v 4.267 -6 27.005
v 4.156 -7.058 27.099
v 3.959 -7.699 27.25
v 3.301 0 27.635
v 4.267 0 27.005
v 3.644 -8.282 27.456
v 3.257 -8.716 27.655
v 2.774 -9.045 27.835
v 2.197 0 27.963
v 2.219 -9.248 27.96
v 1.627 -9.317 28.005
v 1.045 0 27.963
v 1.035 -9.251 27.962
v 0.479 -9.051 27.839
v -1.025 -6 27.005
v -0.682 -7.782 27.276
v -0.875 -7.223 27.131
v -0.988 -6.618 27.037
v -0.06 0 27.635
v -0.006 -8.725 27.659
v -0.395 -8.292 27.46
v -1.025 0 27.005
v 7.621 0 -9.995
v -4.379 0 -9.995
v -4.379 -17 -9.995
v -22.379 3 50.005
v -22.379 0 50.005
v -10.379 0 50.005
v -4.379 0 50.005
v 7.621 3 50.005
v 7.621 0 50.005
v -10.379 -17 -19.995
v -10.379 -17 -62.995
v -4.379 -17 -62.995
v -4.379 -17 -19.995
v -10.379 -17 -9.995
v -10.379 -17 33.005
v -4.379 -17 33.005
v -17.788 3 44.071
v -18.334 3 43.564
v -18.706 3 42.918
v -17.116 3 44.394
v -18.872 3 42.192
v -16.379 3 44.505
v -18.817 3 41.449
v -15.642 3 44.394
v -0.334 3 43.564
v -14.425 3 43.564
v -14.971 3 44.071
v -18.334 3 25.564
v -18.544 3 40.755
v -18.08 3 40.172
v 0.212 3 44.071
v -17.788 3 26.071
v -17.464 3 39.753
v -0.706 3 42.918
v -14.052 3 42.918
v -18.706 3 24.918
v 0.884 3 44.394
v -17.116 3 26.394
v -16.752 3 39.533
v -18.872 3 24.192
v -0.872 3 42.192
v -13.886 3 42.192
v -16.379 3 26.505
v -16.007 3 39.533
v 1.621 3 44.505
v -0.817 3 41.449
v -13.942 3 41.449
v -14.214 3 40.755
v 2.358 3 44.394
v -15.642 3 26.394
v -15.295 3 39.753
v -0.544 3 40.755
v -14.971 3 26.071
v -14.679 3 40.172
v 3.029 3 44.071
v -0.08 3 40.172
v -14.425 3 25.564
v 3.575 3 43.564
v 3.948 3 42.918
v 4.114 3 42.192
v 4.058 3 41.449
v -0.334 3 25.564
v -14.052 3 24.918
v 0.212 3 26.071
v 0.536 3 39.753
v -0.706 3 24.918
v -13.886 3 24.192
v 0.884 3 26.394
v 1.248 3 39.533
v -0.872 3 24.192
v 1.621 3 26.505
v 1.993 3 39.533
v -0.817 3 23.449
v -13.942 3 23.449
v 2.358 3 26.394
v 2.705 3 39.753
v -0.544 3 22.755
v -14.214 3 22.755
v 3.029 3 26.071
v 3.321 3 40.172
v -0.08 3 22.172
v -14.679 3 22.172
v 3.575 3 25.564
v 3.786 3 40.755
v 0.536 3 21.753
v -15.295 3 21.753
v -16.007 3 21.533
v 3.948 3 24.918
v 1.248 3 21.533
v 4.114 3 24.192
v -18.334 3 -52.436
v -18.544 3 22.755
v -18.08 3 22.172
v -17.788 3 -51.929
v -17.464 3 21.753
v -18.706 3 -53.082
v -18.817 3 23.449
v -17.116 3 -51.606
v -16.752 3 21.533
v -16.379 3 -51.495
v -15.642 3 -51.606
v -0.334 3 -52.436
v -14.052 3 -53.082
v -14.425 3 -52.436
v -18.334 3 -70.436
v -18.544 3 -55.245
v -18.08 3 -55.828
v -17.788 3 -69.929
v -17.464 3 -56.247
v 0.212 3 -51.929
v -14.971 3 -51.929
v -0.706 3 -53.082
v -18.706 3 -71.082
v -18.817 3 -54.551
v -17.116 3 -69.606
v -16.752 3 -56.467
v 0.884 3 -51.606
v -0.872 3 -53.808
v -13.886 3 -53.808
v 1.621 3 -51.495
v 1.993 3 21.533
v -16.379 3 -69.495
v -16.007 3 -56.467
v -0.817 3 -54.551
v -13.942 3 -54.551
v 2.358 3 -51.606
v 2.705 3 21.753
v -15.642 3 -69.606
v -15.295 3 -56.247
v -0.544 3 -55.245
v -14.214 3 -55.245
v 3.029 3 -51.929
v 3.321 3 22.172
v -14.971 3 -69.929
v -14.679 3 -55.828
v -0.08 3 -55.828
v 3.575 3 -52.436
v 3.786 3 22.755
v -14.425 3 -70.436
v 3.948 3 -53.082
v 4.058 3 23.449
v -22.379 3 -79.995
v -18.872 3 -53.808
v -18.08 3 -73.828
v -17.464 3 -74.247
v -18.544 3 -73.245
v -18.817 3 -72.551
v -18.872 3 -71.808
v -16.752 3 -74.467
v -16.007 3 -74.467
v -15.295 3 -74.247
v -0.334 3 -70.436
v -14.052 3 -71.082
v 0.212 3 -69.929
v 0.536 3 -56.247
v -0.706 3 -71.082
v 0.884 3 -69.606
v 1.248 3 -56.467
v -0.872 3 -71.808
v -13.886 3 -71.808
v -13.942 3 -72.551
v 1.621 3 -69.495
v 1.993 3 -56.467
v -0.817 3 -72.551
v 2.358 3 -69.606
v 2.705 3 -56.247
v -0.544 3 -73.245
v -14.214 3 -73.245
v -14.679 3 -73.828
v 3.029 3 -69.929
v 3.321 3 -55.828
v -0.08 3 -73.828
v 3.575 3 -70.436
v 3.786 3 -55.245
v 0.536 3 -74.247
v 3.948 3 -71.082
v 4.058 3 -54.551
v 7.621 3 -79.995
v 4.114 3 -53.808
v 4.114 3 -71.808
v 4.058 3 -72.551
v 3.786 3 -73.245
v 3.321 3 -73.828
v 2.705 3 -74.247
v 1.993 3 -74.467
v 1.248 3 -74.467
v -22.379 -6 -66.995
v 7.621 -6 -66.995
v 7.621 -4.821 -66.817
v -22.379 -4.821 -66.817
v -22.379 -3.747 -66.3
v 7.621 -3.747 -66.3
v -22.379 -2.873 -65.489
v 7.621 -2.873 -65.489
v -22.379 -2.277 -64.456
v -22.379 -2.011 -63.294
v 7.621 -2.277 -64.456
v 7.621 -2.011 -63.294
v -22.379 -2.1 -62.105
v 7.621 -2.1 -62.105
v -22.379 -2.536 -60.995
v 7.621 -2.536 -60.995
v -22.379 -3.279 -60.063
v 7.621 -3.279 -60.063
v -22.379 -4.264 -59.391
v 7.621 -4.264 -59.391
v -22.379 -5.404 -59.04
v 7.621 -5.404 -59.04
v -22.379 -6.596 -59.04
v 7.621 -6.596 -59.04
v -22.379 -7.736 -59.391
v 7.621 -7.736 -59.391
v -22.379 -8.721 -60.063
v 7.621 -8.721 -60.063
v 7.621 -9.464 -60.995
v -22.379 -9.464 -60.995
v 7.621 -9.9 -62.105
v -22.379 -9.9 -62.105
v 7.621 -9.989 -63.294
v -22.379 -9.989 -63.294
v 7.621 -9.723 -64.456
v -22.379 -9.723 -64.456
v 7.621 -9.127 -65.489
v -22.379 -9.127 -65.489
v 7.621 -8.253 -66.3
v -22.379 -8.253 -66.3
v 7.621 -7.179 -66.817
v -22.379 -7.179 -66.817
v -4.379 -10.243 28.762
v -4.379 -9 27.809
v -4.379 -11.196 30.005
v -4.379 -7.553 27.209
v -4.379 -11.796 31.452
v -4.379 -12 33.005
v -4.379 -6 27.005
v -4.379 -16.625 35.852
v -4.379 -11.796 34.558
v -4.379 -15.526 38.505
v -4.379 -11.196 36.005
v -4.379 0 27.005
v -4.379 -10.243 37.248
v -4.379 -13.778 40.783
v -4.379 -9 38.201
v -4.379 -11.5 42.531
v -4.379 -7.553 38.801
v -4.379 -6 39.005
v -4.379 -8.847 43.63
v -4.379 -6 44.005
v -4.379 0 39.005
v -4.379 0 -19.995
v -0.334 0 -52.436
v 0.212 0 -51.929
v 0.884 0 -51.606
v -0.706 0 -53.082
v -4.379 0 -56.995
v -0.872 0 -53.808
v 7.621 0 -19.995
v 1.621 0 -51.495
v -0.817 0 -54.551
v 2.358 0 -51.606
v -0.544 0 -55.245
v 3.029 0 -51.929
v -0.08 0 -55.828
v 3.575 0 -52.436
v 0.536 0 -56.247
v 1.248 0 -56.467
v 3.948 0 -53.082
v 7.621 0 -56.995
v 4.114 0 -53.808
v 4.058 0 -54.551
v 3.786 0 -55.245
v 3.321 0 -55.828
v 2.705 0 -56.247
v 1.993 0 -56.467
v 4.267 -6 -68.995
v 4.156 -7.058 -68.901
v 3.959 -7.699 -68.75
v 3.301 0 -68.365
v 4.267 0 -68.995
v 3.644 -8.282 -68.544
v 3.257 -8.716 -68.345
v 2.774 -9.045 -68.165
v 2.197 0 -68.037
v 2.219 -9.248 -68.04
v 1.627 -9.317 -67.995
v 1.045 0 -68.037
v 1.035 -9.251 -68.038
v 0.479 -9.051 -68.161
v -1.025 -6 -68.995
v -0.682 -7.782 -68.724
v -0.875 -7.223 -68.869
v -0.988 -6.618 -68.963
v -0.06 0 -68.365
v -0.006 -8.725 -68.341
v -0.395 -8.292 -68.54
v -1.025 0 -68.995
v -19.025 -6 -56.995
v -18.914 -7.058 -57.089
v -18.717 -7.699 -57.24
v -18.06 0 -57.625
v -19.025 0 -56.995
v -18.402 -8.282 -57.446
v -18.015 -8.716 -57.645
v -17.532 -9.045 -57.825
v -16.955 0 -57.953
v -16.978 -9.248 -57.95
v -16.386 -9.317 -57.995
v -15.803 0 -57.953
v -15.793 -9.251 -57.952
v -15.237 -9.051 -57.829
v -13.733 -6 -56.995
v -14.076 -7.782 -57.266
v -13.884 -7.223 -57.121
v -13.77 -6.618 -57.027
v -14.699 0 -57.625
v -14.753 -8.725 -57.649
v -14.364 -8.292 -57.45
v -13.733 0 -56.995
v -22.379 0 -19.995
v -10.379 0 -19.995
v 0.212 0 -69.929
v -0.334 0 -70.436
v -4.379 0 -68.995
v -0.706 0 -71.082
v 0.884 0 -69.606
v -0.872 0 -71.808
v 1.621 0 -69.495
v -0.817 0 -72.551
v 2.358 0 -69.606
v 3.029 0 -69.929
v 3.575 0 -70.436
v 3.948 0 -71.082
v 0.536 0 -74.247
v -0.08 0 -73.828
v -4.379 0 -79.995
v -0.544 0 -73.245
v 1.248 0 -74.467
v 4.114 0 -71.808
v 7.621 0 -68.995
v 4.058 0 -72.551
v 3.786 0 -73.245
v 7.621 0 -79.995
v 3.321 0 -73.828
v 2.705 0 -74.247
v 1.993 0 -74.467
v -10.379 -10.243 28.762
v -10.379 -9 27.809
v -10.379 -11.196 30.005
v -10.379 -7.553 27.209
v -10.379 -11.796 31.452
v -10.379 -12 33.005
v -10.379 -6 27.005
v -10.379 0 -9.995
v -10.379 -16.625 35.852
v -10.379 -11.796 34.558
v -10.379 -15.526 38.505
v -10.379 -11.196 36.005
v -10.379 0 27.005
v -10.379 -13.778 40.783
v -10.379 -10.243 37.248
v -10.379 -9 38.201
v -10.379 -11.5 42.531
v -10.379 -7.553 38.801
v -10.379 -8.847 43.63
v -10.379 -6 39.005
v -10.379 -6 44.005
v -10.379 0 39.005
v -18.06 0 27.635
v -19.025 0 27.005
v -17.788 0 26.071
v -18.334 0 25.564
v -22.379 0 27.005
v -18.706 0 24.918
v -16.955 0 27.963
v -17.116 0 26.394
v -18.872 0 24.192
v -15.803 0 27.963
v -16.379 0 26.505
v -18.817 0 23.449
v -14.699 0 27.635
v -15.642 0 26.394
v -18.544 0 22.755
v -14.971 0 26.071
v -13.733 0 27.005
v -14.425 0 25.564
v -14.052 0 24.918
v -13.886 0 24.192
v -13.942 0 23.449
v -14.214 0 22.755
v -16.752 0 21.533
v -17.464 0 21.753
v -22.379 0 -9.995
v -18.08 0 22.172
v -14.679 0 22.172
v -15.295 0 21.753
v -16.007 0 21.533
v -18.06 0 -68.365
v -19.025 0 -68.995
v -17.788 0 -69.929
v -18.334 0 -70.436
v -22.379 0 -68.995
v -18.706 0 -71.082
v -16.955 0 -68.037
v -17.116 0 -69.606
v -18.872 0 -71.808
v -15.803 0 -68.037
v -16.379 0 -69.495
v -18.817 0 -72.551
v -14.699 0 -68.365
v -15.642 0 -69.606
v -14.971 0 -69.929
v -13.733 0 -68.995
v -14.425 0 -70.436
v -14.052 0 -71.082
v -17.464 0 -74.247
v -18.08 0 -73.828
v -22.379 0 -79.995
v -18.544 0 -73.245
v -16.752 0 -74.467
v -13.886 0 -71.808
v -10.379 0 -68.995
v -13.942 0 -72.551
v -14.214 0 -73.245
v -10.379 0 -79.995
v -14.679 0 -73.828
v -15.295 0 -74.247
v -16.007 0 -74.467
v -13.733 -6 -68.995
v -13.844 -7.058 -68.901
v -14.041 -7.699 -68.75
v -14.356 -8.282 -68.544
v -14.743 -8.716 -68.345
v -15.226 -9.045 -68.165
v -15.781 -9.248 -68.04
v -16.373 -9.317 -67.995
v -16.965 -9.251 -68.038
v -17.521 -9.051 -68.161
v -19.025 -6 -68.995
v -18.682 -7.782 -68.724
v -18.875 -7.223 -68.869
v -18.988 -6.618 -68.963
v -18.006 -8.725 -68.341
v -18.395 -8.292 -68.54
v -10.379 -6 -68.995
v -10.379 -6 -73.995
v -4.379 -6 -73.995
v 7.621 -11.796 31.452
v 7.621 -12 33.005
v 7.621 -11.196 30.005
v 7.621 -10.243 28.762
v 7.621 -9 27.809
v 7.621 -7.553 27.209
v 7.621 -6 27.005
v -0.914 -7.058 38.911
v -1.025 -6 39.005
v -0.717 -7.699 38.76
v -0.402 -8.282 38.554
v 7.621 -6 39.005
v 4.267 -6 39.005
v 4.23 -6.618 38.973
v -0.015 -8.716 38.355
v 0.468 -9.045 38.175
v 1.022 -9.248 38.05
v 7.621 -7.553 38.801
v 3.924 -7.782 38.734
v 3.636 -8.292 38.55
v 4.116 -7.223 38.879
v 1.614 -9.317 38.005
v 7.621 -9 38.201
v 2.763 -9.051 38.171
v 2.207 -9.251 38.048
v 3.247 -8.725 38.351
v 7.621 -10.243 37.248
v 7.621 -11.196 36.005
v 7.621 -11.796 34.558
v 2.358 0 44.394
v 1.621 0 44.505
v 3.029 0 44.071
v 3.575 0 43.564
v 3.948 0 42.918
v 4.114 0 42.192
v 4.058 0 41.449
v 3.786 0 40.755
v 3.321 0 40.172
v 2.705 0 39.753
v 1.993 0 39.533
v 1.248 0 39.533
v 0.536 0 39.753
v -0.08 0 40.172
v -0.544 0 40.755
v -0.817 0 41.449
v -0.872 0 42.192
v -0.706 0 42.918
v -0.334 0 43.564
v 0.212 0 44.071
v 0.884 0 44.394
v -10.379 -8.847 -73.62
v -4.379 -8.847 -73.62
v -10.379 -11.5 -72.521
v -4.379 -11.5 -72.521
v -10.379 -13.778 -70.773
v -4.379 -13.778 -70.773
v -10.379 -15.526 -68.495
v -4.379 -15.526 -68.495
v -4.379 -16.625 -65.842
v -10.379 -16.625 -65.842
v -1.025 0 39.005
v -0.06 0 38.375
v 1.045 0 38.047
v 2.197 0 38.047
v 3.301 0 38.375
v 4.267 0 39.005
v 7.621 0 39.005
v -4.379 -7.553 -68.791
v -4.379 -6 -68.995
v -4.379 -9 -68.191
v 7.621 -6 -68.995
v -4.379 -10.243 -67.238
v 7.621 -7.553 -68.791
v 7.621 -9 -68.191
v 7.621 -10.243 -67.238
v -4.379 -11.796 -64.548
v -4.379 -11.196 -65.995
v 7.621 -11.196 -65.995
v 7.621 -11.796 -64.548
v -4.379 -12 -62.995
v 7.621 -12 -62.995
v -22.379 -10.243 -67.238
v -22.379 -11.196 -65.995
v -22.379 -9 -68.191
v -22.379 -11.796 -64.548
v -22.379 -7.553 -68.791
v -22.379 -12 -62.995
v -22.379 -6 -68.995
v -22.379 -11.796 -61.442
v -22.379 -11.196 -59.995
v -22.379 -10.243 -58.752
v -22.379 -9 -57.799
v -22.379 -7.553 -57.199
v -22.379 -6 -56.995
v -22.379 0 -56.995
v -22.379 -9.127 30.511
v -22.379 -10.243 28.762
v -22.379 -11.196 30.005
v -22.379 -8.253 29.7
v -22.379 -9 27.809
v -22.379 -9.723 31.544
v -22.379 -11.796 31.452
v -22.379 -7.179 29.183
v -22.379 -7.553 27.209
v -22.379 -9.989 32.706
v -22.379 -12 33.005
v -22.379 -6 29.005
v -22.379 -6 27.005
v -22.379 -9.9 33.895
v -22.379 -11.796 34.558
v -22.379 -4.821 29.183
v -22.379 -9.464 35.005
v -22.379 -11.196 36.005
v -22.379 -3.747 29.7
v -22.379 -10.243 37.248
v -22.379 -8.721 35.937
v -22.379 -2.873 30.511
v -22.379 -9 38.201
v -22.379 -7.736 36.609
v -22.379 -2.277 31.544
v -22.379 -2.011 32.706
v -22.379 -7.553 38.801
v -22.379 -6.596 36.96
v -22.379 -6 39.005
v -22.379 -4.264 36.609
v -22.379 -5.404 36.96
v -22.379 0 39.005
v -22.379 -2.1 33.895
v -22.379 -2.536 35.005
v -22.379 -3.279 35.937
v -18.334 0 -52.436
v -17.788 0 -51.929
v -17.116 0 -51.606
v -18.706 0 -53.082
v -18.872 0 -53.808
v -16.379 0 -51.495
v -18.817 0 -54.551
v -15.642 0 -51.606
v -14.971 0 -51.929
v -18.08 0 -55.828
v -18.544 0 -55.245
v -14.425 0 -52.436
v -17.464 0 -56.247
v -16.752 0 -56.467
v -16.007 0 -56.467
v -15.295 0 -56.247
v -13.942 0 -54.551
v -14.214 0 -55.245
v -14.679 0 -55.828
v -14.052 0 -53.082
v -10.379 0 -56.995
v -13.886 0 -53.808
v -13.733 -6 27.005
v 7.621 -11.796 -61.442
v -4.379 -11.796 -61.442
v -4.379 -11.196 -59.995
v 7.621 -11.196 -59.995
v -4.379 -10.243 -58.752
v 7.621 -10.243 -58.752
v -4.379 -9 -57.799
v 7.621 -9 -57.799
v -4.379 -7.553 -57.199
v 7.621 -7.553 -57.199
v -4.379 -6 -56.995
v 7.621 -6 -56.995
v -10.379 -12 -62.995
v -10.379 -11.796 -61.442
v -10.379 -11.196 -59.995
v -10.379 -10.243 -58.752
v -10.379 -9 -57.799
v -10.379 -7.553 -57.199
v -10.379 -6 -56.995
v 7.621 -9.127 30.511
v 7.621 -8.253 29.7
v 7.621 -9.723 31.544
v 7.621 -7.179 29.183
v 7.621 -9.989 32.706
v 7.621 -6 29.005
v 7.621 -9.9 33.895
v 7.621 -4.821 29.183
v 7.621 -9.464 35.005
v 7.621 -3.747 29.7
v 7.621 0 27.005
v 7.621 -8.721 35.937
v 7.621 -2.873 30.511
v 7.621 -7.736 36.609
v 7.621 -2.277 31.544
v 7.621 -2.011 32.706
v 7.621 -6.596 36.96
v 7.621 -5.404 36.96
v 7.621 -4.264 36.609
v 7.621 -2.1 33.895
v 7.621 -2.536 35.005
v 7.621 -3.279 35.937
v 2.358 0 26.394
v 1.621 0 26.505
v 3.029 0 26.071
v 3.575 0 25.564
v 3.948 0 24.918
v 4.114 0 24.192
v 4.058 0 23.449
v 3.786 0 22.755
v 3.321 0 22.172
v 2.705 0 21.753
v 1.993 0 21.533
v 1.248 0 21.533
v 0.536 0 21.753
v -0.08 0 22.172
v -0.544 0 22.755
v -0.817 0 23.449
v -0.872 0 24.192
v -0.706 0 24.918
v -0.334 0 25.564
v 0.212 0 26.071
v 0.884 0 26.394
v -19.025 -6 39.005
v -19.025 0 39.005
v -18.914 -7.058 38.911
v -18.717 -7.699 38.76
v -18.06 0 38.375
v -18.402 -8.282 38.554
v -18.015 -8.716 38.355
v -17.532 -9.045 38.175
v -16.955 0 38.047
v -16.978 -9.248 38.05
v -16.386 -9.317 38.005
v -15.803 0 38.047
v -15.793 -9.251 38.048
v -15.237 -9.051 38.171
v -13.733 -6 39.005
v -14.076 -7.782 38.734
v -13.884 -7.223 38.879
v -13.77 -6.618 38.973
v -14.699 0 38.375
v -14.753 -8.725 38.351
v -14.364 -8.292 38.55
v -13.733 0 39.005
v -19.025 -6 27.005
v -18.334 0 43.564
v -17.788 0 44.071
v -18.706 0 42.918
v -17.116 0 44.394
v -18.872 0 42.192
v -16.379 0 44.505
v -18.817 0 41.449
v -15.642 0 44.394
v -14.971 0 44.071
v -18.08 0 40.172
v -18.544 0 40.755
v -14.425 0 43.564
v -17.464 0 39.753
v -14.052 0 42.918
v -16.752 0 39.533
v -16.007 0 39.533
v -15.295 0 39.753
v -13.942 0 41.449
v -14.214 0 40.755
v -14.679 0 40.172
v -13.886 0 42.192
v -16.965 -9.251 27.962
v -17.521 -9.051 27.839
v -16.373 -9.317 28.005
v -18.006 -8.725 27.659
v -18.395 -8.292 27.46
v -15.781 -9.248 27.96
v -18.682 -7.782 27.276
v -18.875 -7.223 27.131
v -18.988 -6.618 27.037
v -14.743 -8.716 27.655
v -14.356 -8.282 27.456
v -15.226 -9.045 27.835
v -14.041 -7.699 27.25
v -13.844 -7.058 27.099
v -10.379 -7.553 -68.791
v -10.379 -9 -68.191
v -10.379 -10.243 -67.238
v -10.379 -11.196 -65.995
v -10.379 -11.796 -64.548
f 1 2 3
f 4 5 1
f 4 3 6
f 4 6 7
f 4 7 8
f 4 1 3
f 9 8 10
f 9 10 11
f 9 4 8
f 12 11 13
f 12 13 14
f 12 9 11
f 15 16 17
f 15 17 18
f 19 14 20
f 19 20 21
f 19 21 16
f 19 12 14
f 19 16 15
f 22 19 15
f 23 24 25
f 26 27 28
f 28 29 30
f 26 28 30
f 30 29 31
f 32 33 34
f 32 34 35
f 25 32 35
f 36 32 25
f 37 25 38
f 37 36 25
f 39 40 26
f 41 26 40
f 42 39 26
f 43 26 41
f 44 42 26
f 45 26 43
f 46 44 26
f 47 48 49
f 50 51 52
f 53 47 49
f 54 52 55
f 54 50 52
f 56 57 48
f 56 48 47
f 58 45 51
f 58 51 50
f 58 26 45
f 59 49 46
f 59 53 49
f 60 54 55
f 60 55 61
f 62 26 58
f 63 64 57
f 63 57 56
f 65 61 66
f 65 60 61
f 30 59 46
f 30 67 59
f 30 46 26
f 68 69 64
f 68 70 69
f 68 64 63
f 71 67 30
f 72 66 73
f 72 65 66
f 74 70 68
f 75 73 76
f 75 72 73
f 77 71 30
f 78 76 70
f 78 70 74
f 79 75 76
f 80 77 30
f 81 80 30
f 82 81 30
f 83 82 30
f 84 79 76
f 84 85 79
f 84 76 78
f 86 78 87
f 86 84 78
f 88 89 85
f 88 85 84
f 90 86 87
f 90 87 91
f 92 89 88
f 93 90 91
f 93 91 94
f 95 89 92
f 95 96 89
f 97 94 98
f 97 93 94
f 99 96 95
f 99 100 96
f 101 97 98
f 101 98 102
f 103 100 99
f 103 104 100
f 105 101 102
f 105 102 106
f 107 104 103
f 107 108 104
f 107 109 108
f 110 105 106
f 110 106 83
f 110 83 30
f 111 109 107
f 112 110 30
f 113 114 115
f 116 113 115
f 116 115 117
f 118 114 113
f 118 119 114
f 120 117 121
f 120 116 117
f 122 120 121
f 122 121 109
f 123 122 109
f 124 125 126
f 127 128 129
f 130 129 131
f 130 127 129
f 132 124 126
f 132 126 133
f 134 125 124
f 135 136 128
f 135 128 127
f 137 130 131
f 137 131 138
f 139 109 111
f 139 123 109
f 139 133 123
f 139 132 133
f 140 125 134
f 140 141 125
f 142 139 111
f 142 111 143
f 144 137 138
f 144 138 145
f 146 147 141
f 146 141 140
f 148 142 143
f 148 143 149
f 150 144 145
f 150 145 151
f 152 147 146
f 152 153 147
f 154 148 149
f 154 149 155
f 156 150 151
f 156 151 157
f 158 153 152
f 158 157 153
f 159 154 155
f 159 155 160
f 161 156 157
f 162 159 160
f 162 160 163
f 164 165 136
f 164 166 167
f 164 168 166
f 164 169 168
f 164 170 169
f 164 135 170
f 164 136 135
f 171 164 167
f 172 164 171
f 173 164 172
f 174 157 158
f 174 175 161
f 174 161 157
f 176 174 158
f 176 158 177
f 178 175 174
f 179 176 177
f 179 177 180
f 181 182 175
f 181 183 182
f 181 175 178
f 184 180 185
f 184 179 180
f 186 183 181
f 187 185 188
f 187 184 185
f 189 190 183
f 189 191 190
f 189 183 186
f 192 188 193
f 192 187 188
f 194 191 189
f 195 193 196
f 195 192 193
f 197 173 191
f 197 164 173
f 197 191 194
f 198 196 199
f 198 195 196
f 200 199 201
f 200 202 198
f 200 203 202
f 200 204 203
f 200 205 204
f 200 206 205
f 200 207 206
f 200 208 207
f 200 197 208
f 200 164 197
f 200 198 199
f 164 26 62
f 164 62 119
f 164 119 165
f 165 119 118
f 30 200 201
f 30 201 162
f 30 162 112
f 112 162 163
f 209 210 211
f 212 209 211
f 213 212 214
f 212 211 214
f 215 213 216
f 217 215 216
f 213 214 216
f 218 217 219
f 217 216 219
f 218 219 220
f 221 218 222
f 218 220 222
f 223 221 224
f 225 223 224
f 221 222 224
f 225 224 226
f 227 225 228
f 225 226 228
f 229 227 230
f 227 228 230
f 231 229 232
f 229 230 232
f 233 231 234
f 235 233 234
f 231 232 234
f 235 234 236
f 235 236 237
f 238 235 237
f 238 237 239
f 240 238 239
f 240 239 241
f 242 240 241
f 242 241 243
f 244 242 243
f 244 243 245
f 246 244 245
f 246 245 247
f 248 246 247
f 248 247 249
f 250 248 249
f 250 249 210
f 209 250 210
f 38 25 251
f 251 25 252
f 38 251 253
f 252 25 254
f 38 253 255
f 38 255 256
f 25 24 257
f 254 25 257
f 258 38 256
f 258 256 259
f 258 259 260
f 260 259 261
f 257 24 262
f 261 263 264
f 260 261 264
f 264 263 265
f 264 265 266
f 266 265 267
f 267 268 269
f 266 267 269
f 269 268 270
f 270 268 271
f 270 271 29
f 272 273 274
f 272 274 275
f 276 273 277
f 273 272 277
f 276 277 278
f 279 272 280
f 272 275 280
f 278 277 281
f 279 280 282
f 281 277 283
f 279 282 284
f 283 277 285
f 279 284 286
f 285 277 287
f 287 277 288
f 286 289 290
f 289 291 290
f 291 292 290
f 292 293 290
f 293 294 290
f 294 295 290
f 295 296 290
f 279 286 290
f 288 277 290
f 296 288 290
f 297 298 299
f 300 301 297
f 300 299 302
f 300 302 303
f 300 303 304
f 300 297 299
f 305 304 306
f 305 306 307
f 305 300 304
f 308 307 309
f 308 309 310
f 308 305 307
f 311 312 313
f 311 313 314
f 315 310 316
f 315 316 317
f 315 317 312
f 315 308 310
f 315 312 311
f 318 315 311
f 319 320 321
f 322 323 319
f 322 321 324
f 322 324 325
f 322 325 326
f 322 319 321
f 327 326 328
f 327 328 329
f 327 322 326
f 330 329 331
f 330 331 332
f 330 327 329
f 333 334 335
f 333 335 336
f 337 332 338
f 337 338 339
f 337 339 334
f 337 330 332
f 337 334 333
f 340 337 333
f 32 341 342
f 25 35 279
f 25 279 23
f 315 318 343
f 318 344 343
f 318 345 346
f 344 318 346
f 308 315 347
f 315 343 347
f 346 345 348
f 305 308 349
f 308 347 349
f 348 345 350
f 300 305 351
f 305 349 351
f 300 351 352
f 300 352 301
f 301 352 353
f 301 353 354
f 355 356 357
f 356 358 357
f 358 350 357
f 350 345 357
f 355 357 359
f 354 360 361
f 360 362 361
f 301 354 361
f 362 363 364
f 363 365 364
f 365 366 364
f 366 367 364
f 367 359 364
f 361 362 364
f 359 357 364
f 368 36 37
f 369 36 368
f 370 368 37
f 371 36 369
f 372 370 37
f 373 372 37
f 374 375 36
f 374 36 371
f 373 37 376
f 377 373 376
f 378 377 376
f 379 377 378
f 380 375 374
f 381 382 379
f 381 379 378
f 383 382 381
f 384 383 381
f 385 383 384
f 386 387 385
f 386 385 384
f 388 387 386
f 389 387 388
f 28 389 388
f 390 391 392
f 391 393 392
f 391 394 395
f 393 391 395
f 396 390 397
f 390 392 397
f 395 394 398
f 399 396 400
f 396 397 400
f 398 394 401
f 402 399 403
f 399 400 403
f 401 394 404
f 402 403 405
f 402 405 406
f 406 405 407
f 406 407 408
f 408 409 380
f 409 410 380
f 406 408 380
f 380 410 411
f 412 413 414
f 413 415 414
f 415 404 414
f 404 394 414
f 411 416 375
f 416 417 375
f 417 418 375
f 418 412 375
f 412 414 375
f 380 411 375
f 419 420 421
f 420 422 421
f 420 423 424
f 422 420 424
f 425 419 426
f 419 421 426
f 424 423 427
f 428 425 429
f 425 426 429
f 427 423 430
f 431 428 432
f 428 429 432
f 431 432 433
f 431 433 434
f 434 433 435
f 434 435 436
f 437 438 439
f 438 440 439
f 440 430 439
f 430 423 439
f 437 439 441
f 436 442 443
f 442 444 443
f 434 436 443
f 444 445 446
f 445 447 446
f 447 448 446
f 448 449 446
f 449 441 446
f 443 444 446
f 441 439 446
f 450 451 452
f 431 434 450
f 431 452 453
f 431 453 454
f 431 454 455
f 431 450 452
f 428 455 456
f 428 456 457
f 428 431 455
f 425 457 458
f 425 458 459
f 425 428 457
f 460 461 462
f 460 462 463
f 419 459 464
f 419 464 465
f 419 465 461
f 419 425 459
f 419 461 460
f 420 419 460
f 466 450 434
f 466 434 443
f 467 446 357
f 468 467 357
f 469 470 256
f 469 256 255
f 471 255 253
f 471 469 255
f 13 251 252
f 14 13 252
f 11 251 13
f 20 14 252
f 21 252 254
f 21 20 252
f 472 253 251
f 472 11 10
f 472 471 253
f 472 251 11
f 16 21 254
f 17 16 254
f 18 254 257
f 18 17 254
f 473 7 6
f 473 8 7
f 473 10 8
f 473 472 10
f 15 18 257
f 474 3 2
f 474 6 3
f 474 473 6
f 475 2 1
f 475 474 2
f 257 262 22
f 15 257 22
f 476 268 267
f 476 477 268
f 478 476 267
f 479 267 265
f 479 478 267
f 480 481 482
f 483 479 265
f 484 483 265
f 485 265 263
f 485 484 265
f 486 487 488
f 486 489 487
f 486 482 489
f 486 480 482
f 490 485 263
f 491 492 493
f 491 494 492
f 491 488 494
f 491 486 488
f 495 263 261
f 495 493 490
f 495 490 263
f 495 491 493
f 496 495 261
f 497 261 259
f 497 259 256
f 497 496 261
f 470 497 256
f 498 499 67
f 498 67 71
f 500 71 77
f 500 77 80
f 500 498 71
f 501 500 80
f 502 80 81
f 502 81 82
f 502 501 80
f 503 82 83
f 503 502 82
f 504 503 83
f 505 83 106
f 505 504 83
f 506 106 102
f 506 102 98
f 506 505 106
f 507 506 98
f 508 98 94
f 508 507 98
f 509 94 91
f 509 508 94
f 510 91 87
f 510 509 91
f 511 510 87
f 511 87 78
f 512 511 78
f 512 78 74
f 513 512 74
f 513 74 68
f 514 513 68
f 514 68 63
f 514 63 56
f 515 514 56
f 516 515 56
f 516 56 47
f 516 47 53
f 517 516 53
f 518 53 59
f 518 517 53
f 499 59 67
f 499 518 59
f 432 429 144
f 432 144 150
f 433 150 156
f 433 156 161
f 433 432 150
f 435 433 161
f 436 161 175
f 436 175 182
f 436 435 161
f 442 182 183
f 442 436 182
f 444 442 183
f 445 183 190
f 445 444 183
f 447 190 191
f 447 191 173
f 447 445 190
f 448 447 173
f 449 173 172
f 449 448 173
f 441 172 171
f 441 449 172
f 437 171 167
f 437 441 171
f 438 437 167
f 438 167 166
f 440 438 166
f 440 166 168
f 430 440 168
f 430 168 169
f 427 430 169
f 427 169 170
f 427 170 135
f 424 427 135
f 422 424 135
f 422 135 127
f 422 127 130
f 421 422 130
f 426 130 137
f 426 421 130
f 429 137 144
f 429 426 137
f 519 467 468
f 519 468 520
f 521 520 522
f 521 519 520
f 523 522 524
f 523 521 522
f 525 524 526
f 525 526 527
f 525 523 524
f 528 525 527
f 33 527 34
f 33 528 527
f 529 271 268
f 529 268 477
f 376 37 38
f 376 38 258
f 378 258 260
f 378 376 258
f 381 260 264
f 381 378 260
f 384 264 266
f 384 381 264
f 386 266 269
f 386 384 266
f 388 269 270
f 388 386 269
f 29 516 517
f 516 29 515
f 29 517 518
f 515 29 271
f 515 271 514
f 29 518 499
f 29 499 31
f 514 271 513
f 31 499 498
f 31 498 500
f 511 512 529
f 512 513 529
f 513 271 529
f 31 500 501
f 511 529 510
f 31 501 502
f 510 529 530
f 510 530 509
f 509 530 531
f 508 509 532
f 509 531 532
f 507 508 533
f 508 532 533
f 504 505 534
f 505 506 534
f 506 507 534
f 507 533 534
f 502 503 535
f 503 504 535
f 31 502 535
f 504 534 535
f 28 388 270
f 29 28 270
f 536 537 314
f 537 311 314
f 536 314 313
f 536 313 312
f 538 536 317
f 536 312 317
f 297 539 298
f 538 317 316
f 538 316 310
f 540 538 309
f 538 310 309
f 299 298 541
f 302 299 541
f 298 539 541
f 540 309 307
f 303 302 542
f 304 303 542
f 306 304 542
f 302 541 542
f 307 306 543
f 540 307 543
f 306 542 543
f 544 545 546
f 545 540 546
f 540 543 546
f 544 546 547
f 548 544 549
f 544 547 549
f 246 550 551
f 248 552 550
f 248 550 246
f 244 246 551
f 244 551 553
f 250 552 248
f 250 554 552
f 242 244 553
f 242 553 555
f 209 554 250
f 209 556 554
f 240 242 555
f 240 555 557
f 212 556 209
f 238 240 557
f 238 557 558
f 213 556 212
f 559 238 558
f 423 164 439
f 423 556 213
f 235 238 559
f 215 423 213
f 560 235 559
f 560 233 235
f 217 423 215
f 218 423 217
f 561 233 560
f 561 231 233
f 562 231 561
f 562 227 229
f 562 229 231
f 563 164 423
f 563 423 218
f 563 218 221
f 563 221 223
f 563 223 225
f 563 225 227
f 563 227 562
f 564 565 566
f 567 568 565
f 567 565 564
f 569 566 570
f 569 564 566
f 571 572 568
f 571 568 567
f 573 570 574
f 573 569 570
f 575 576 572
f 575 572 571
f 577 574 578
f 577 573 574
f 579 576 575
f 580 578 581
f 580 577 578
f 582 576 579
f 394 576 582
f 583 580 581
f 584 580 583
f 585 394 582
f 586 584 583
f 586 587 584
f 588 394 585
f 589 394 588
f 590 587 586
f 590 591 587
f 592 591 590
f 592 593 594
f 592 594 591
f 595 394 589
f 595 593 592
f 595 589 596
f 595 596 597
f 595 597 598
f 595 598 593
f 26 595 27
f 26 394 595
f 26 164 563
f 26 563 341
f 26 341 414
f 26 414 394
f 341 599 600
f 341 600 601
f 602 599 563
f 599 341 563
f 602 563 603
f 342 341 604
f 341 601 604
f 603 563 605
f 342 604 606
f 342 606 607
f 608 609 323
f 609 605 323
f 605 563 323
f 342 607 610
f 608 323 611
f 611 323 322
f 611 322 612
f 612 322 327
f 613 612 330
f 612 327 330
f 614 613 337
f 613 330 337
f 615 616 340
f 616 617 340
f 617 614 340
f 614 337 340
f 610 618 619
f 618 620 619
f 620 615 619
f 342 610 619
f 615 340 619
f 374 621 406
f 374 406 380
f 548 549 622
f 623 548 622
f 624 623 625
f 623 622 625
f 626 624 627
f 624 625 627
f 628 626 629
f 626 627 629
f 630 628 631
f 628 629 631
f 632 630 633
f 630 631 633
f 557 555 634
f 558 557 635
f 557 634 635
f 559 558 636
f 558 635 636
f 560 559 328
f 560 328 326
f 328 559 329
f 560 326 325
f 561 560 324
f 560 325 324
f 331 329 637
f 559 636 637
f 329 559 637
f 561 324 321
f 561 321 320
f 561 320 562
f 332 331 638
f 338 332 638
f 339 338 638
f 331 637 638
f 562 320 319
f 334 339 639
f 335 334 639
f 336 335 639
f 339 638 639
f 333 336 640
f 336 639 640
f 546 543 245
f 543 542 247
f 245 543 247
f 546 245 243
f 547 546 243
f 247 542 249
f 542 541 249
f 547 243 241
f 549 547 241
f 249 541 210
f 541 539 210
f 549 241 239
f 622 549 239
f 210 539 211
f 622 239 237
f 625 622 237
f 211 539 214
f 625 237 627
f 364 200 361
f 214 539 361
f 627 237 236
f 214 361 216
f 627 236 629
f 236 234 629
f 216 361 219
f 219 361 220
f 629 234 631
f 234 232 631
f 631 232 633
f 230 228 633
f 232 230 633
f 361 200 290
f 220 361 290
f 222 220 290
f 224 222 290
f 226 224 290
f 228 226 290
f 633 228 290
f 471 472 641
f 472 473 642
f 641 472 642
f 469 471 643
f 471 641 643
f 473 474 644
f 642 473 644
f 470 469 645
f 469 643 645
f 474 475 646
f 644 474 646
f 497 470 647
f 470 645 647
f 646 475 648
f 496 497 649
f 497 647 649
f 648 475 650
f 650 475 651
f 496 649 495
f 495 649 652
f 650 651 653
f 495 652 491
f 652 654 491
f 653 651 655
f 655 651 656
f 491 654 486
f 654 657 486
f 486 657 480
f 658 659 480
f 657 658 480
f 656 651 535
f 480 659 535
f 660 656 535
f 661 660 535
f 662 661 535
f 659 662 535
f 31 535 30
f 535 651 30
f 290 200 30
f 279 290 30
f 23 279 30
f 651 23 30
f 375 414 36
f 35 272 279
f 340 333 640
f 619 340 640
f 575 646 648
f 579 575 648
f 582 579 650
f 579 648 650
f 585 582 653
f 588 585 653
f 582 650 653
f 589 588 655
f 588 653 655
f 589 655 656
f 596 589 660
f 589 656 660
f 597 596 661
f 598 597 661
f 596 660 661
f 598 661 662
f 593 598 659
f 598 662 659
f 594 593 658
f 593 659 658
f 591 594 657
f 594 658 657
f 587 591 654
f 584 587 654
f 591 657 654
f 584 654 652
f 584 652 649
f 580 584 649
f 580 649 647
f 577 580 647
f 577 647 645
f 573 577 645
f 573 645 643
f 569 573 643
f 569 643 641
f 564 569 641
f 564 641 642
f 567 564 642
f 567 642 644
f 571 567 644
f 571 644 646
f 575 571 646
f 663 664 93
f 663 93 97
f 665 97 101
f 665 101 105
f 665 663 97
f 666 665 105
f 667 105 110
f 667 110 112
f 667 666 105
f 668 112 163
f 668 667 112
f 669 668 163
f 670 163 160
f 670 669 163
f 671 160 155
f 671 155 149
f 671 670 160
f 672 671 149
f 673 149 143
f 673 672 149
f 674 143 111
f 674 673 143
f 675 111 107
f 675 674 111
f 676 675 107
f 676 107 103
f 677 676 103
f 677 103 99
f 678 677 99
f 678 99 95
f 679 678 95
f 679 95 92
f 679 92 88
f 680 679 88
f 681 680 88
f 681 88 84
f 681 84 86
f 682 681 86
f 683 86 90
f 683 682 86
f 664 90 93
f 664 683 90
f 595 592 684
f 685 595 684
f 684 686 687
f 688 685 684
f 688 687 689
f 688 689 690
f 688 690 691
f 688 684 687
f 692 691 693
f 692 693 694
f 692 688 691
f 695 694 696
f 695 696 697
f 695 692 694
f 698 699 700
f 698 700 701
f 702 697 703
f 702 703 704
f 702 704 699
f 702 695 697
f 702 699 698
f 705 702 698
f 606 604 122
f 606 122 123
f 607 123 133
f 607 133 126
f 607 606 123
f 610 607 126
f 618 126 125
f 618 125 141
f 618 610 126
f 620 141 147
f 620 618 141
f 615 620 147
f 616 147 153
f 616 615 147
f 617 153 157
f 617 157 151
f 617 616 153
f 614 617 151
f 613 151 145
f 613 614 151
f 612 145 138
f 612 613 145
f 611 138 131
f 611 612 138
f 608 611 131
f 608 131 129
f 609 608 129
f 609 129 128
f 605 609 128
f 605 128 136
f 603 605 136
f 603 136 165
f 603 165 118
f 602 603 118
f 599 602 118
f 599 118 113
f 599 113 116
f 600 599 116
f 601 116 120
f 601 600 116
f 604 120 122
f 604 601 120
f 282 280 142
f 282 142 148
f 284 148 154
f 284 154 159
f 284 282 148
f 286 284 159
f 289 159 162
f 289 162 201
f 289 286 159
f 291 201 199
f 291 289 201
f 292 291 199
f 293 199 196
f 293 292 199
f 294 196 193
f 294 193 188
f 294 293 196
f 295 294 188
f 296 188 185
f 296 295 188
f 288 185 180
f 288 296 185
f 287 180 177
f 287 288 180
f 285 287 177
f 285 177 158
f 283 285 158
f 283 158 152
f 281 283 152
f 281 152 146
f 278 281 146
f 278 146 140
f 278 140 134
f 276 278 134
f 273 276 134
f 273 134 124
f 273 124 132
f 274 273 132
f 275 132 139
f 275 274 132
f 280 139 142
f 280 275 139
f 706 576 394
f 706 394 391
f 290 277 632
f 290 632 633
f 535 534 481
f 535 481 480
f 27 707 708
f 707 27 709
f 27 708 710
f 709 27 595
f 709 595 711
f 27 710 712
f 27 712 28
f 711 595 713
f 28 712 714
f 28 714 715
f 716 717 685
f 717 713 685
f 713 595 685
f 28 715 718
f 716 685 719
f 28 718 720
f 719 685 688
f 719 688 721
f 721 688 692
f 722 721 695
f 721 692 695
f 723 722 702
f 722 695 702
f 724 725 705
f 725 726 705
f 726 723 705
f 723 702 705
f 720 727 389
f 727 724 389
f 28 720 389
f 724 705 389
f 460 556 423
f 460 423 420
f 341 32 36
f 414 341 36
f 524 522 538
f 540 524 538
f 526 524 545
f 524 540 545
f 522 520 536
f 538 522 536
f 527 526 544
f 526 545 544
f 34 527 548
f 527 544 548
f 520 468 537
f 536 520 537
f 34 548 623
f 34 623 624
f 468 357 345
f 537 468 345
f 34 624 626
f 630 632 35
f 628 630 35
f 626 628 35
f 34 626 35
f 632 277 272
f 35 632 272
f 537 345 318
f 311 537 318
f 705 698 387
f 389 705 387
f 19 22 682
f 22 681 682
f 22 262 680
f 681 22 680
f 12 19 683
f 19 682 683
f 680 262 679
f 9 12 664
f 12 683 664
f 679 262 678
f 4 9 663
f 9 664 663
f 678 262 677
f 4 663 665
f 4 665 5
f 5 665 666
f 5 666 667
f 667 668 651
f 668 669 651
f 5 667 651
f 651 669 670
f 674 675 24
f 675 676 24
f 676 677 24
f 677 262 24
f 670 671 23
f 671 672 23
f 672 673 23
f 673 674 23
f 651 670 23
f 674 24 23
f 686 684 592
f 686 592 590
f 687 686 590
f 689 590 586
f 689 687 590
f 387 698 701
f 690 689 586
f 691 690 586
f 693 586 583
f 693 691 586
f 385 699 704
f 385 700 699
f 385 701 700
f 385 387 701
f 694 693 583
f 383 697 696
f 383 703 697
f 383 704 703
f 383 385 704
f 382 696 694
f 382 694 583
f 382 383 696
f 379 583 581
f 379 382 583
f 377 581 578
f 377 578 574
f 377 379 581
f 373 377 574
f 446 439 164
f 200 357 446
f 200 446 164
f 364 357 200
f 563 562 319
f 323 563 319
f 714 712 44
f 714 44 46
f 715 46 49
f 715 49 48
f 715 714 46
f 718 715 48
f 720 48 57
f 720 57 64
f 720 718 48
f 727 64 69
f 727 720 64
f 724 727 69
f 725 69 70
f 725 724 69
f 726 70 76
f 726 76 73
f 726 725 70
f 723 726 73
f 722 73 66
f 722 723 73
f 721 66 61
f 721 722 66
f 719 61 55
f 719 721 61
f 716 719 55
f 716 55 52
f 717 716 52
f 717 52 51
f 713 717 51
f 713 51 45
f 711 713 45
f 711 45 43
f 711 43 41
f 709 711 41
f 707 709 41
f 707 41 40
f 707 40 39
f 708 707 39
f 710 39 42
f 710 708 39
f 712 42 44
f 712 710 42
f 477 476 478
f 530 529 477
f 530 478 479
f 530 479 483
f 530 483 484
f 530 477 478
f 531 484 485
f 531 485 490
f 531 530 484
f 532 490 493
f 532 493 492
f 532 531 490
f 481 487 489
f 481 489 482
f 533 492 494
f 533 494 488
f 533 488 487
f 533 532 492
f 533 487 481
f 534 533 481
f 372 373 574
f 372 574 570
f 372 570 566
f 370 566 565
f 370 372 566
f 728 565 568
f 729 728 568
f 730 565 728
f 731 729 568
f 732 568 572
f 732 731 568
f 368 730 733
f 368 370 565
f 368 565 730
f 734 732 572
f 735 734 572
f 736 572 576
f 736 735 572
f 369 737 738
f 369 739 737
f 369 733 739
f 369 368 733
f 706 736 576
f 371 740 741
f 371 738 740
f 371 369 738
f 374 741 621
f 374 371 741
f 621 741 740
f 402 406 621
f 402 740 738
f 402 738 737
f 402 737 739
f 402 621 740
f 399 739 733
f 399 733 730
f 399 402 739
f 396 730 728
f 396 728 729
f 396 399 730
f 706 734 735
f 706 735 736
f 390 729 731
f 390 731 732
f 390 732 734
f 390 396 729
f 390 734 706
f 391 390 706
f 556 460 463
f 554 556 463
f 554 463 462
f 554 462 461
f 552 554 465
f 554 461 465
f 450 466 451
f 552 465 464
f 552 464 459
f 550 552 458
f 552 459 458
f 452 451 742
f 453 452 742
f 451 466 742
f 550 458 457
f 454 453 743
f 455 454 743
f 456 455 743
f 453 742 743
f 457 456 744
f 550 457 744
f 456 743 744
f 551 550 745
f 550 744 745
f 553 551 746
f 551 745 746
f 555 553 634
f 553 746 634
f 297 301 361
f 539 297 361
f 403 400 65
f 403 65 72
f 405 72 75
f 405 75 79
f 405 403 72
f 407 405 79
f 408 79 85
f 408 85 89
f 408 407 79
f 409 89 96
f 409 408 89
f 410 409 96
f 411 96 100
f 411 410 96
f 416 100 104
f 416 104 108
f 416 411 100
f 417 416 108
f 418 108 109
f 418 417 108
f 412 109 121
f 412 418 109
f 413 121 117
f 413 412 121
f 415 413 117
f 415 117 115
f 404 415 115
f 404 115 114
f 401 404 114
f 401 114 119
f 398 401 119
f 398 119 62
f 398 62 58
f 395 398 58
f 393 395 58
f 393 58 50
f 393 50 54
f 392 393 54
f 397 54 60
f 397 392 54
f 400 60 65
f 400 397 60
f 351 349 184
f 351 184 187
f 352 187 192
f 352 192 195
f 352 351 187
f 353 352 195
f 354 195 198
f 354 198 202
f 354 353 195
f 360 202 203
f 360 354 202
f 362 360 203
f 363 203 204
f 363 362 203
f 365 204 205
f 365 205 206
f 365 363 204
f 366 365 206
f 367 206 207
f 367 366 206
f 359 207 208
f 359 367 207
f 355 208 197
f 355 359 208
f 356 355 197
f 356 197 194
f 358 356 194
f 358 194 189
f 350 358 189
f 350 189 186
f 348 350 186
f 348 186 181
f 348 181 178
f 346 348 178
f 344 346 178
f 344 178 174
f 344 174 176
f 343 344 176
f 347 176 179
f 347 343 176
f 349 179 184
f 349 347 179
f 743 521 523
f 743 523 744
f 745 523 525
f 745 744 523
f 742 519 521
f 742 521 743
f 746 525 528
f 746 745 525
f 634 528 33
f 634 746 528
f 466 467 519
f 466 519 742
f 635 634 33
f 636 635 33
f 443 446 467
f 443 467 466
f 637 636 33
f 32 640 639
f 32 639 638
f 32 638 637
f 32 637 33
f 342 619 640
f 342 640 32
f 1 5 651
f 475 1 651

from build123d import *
from OCP.BRepFilletAPI import BRepFilletAPI_MakeChamfer

# Parameters (mm, degrees)
SKETCH1_W           = 30
SKETCH1_H           = 130
SKETCH1_R           = 2.5
BOSS_EXTRUDE1_DEPTH = 3
SKETCH2_W           = 30
SKETCH2_H           = 12
BOSS_EXTRUDE2_DEPTH = 12
CUT_EXTRUDE1_REACH  = 88.274
SKETCH3_R           = 4
FILLET1_R           = 6
SKETCH4_R           = 4
CUT_EXTRUDE2_DEPTH  = 19
SKETCH5_W           = 6
SKETCH5_H           = 84
SKETCH5_H_2         = 11
BOSS_EXTRUDE3_DEPTH = 6
CHAMFER1_SIZE       = 6
BOSS_EXTRUDE4_DEPTH = 6
SKETCH7_W           = 12
SKETCH7_H           = 10
BOSS_EXTRUDE5_DEPTH = 17
CHAMFER2_SIZE       = 17
CHAMFER2_SIZE2      = 12


with BuildPart() as part:
    # Sketch1 → Boss-Extrude1 (new body)
    with BuildSketch(Plane(origin=(0, 0, 0), x_dir=(1, 0, 0), z_dir=(0, 1, 0))):
        with Locations((-7.37923135, 14.994995261)):
            Rectangle(SKETCH1_W, SKETCH1_H)
        with Locations(Location((-16.37923135, -24.005004739, 0), (0, 0, 270))):
            Circle(SKETCH1_R, mode=Mode.SUBTRACT)
        with Locations(Location((1.62076865, -24.005004739, 0), (0, 0, 270))):
            Circle(SKETCH1_R, mode=Mode.SUBTRACT)
        with Locations(Location((1.62076865, -42.005004739, 0), (0, 0, 270))):
            Circle(SKETCH1_R, mode=Mode.SUBTRACT)
        with Locations(Location((-16.37923135, -42.005004739, 0), (0, 0, 270))):
            Circle(SKETCH1_R, mode=Mode.SUBTRACT)
        with Locations(Location((-16.37923135, 71.994995261, 0), (0, 0, 270))):
            Circle(SKETCH1_R, mode=Mode.SUBTRACT)
        with Locations(Location((-16.37923135, 53.994995261, 0), (0, 0, 270))):
            Circle(SKETCH1_R, mode=Mode.SUBTRACT)
        with Locations(Location((1.62076865, 71.994995261, 0), (0, 0, 270))):
            Circle(SKETCH1_R, mode=Mode.SUBTRACT)
        with Locations(Location((1.62076865, 53.994995261, 0), (0, 0, 270))):
            Circle(SKETCH1_R, mode=Mode.SUBTRACT)
    extrude(amount=BOSS_EXTRUDE1_DEPTH)

    # Sketch2 → Boss-Extrude2 (add)
    with BuildSketch(Plane.XZ):
        with Locations((-7.37923135, -62.994995261)):
            Rectangle(SKETCH2_W, SKETCH2_H)
        with Locations((-7.37923135, 33.005004739)):
            Rectangle(SKETCH2_W, SKETCH2_H)
    extrude(amount=BOSS_EXTRUDE2_DEPTH)

    # Sketch3 → Cut-Extrude1 (cut, up to next)
    with BuildSketch(Plane(origin=(7.62076865, 0, 0), x_dir=(0, 0, -1), z_dir=(1, 0, 0)), mode=Mode.PRIVATE) as cut_extrude1_sk1:
        with Locations((-33.005004739, -6)):
            Circle(SKETCH3_R)
    cut_extrude1_tool1 = extrude(cut_extrude1_sk1.sketch, amount=-CUT_EXTRUDE1_REACH, mode=Mode.PRIVATE) & part.part
    # Sketch3 → Cut-Extrude1 (cut, up to next)
    with BuildSketch(Plane(origin=(7.62076865, 0, 0), x_dir=(0, 0, -1), z_dir=(1, 0, 0)), mode=Mode.PRIVATE) as cut_extrude1_sk2:
        with Locations((62.994995261, -6)):
            Circle(SKETCH3_R)
    cut_extrude1_tool2 = extrude(cut_extrude1_sk2.sketch, amount=-CUT_EXTRUDE1_REACH, mode=Mode.PRIVATE) & part.part
    add(cut_extrude1_tool1.solids().sort_by_distance((7.620769, -6, 33.005005))[0], mode=Mode.SUBTRACT)
    add(cut_extrude1_tool2.solids().sort_by_distance((7.620769, -6, -62.994995))[0], mode=Mode.SUBTRACT)

    # Fillet1
    fillet1_edges = [part.edges().sort_by_distance(p)[0] for p in [
        (-7.37923135, -12, -68.994995261),
        (-7.37923135, -12, -56.994995261),
        (-7.37923135, -12, 27.005004739),
        (-7.37923135, -12, 39.005004739),
    ]]
    fillet(fillet1_edges, radius=FILLET1_R - 0.0001)  # a hair under: the kernel refuses the full size

    # Sketch4 → Cut-Extrude2 (cut)
    with BuildSketch(Plane.XZ):
        with Locations((-16.37923135, -53.994995261)):
            Circle(SKETCH4_R)
        with Locations((-16.37923135, -71.994995261)):
            Circle(SKETCH4_R)
        with Locations((1.62076865, -71.994995261)):
            Circle(SKETCH4_R)
        with Locations((1.62076865, -3.994995261)):
            Circle(SKETCH4_R)
        with Locations((1.62076865, 24.005004739)):
            Circle(SKETCH4_R)
        with Locations((-16.37923135, 24.005004739)):
            Circle(SKETCH4_R)
        with Locations((-16.37923135, 42.005004739)):
            Circle(SKETCH4_R)
        with Locations((1.62076865, 42.005004739)):
            Circle(SKETCH4_R)
    extrude(amount=CUT_EXTRUDE2_DEPTH, mode=Mode.SUBTRACT)

    # Sketch5 → Boss-Extrude3 (add)
    with BuildSketch(Plane.XZ):
        with Locations((-7.37923135, -14.994995261)):
            Rectangle(SKETCH5_W, SKETCH5_H)
        with Locations((-7.37923135, -74.494995261)):
            Rectangle(SKETCH5_W, SKETCH5_H_2)
        with Locations((-7.37923135, 44.505004739)):
            Rectangle(SKETCH5_W, SKETCH5_H_2)
    extrude(amount=BOSS_EXTRUDE3_DEPTH)

    # Chamfer1
    chamfer1_edges = [part.edges().sort_by_distance(p)[0] for p in [
        (-7.37923135, -6, -79.994995261),
        (-7.37923135, -6, 50.005004739),
    ]]
    chamfer(chamfer1_edges, length=CHAMFER1_SIZE)

    # Sketch6 → Boss-Extrude4 (add)
    with BuildSketch(Plane.ZY.offset(10.37923135)):
        with BuildLine():
            Line((-62.994995261, -17), (33.005004739, -17))
            ThreePointArc((33.005004739, -17), (40.783179332, -13.778174593), (44.005004739, -6))
            Line((44.005004739, -6), (39.005004739, -6))
            ThreePointArc((39.005004739, -6), (33.005004739, -12), (27.005004739, -6))
            Line((27.005004739, -6), (-56.994995261, -6))
            ThreePointArc((-56.994995261, -6), (-62.994995261, -12), (-68.994995261, -6))
            Line((-68.994995261, -6), (-73.994995261, -6))
            ThreePointArc((-73.994995261, -6), (-70.773169854, -13.778174593), (-62.994995261, -17))
        make_face()
    extrude(amount=-BOSS_EXTRUDE4_DEPTH)

    # Sketch7 → Boss-Extrude5 (add)
    with BuildSketch(Plane.XZ):
        with Locations((-16.37923135, -14.994995261)):
            Rectangle(SKETCH7_W, SKETCH7_H)
        with Locations((1.62076865, -14.994995261)):
            Rectangle(SKETCH7_W, SKETCH7_H)
    extrude(amount=BOSS_EXTRUDE5_DEPTH)

    # Chamfer2: one chamfer whose edges measure the first distance from different faces: ONE call of the kernel's chamfer builder (chamfer() names one face for all edges)
    chamfer2_edges_1 = [part.edges().sort_by_distance(p)[0] for p in [
        (-22.37923135, -17, -14.994995261),
    ]]
    chamfer2_side_1 = [part.faces().sort_by_distance(p)[0] for p in [
        (-22.37923135, -2.310192331, -14.994995261),
    ]]
    chamfer2_edges_2 = [part.edges().sort_by_distance(p)[0] for p in [
        (7.62076865, -17, -14.994995261),
    ]]
    chamfer2_side_2 = [part.faces().sort_by_distance(p)[0] for p in [
        (7.62076865, -2.310192331, -14.994995261),
    ]]
    chamfer2 = BRepFilletAPI_MakeChamfer(part.part.solid().wrapped)
    for e in chamfer2_edges_1:
        chamfer2.Add(CHAMFER2_SIZE, CHAMFER2_SIZE2, e.wrapped, chamfer2_side_1[0].wrapped)  # the first distance lies on this face
    for e in chamfer2_edges_2:
        chamfer2.Add(CHAMFER2_SIZE, CHAMFER2_SIZE2, e.wrapped, chamfer2_side_2[0].wrapped)  # the first distance lies on this face
    add(Compound.cast(chamfer2.Shape()), mode=Mode.REPLACE)


solid = part.part
